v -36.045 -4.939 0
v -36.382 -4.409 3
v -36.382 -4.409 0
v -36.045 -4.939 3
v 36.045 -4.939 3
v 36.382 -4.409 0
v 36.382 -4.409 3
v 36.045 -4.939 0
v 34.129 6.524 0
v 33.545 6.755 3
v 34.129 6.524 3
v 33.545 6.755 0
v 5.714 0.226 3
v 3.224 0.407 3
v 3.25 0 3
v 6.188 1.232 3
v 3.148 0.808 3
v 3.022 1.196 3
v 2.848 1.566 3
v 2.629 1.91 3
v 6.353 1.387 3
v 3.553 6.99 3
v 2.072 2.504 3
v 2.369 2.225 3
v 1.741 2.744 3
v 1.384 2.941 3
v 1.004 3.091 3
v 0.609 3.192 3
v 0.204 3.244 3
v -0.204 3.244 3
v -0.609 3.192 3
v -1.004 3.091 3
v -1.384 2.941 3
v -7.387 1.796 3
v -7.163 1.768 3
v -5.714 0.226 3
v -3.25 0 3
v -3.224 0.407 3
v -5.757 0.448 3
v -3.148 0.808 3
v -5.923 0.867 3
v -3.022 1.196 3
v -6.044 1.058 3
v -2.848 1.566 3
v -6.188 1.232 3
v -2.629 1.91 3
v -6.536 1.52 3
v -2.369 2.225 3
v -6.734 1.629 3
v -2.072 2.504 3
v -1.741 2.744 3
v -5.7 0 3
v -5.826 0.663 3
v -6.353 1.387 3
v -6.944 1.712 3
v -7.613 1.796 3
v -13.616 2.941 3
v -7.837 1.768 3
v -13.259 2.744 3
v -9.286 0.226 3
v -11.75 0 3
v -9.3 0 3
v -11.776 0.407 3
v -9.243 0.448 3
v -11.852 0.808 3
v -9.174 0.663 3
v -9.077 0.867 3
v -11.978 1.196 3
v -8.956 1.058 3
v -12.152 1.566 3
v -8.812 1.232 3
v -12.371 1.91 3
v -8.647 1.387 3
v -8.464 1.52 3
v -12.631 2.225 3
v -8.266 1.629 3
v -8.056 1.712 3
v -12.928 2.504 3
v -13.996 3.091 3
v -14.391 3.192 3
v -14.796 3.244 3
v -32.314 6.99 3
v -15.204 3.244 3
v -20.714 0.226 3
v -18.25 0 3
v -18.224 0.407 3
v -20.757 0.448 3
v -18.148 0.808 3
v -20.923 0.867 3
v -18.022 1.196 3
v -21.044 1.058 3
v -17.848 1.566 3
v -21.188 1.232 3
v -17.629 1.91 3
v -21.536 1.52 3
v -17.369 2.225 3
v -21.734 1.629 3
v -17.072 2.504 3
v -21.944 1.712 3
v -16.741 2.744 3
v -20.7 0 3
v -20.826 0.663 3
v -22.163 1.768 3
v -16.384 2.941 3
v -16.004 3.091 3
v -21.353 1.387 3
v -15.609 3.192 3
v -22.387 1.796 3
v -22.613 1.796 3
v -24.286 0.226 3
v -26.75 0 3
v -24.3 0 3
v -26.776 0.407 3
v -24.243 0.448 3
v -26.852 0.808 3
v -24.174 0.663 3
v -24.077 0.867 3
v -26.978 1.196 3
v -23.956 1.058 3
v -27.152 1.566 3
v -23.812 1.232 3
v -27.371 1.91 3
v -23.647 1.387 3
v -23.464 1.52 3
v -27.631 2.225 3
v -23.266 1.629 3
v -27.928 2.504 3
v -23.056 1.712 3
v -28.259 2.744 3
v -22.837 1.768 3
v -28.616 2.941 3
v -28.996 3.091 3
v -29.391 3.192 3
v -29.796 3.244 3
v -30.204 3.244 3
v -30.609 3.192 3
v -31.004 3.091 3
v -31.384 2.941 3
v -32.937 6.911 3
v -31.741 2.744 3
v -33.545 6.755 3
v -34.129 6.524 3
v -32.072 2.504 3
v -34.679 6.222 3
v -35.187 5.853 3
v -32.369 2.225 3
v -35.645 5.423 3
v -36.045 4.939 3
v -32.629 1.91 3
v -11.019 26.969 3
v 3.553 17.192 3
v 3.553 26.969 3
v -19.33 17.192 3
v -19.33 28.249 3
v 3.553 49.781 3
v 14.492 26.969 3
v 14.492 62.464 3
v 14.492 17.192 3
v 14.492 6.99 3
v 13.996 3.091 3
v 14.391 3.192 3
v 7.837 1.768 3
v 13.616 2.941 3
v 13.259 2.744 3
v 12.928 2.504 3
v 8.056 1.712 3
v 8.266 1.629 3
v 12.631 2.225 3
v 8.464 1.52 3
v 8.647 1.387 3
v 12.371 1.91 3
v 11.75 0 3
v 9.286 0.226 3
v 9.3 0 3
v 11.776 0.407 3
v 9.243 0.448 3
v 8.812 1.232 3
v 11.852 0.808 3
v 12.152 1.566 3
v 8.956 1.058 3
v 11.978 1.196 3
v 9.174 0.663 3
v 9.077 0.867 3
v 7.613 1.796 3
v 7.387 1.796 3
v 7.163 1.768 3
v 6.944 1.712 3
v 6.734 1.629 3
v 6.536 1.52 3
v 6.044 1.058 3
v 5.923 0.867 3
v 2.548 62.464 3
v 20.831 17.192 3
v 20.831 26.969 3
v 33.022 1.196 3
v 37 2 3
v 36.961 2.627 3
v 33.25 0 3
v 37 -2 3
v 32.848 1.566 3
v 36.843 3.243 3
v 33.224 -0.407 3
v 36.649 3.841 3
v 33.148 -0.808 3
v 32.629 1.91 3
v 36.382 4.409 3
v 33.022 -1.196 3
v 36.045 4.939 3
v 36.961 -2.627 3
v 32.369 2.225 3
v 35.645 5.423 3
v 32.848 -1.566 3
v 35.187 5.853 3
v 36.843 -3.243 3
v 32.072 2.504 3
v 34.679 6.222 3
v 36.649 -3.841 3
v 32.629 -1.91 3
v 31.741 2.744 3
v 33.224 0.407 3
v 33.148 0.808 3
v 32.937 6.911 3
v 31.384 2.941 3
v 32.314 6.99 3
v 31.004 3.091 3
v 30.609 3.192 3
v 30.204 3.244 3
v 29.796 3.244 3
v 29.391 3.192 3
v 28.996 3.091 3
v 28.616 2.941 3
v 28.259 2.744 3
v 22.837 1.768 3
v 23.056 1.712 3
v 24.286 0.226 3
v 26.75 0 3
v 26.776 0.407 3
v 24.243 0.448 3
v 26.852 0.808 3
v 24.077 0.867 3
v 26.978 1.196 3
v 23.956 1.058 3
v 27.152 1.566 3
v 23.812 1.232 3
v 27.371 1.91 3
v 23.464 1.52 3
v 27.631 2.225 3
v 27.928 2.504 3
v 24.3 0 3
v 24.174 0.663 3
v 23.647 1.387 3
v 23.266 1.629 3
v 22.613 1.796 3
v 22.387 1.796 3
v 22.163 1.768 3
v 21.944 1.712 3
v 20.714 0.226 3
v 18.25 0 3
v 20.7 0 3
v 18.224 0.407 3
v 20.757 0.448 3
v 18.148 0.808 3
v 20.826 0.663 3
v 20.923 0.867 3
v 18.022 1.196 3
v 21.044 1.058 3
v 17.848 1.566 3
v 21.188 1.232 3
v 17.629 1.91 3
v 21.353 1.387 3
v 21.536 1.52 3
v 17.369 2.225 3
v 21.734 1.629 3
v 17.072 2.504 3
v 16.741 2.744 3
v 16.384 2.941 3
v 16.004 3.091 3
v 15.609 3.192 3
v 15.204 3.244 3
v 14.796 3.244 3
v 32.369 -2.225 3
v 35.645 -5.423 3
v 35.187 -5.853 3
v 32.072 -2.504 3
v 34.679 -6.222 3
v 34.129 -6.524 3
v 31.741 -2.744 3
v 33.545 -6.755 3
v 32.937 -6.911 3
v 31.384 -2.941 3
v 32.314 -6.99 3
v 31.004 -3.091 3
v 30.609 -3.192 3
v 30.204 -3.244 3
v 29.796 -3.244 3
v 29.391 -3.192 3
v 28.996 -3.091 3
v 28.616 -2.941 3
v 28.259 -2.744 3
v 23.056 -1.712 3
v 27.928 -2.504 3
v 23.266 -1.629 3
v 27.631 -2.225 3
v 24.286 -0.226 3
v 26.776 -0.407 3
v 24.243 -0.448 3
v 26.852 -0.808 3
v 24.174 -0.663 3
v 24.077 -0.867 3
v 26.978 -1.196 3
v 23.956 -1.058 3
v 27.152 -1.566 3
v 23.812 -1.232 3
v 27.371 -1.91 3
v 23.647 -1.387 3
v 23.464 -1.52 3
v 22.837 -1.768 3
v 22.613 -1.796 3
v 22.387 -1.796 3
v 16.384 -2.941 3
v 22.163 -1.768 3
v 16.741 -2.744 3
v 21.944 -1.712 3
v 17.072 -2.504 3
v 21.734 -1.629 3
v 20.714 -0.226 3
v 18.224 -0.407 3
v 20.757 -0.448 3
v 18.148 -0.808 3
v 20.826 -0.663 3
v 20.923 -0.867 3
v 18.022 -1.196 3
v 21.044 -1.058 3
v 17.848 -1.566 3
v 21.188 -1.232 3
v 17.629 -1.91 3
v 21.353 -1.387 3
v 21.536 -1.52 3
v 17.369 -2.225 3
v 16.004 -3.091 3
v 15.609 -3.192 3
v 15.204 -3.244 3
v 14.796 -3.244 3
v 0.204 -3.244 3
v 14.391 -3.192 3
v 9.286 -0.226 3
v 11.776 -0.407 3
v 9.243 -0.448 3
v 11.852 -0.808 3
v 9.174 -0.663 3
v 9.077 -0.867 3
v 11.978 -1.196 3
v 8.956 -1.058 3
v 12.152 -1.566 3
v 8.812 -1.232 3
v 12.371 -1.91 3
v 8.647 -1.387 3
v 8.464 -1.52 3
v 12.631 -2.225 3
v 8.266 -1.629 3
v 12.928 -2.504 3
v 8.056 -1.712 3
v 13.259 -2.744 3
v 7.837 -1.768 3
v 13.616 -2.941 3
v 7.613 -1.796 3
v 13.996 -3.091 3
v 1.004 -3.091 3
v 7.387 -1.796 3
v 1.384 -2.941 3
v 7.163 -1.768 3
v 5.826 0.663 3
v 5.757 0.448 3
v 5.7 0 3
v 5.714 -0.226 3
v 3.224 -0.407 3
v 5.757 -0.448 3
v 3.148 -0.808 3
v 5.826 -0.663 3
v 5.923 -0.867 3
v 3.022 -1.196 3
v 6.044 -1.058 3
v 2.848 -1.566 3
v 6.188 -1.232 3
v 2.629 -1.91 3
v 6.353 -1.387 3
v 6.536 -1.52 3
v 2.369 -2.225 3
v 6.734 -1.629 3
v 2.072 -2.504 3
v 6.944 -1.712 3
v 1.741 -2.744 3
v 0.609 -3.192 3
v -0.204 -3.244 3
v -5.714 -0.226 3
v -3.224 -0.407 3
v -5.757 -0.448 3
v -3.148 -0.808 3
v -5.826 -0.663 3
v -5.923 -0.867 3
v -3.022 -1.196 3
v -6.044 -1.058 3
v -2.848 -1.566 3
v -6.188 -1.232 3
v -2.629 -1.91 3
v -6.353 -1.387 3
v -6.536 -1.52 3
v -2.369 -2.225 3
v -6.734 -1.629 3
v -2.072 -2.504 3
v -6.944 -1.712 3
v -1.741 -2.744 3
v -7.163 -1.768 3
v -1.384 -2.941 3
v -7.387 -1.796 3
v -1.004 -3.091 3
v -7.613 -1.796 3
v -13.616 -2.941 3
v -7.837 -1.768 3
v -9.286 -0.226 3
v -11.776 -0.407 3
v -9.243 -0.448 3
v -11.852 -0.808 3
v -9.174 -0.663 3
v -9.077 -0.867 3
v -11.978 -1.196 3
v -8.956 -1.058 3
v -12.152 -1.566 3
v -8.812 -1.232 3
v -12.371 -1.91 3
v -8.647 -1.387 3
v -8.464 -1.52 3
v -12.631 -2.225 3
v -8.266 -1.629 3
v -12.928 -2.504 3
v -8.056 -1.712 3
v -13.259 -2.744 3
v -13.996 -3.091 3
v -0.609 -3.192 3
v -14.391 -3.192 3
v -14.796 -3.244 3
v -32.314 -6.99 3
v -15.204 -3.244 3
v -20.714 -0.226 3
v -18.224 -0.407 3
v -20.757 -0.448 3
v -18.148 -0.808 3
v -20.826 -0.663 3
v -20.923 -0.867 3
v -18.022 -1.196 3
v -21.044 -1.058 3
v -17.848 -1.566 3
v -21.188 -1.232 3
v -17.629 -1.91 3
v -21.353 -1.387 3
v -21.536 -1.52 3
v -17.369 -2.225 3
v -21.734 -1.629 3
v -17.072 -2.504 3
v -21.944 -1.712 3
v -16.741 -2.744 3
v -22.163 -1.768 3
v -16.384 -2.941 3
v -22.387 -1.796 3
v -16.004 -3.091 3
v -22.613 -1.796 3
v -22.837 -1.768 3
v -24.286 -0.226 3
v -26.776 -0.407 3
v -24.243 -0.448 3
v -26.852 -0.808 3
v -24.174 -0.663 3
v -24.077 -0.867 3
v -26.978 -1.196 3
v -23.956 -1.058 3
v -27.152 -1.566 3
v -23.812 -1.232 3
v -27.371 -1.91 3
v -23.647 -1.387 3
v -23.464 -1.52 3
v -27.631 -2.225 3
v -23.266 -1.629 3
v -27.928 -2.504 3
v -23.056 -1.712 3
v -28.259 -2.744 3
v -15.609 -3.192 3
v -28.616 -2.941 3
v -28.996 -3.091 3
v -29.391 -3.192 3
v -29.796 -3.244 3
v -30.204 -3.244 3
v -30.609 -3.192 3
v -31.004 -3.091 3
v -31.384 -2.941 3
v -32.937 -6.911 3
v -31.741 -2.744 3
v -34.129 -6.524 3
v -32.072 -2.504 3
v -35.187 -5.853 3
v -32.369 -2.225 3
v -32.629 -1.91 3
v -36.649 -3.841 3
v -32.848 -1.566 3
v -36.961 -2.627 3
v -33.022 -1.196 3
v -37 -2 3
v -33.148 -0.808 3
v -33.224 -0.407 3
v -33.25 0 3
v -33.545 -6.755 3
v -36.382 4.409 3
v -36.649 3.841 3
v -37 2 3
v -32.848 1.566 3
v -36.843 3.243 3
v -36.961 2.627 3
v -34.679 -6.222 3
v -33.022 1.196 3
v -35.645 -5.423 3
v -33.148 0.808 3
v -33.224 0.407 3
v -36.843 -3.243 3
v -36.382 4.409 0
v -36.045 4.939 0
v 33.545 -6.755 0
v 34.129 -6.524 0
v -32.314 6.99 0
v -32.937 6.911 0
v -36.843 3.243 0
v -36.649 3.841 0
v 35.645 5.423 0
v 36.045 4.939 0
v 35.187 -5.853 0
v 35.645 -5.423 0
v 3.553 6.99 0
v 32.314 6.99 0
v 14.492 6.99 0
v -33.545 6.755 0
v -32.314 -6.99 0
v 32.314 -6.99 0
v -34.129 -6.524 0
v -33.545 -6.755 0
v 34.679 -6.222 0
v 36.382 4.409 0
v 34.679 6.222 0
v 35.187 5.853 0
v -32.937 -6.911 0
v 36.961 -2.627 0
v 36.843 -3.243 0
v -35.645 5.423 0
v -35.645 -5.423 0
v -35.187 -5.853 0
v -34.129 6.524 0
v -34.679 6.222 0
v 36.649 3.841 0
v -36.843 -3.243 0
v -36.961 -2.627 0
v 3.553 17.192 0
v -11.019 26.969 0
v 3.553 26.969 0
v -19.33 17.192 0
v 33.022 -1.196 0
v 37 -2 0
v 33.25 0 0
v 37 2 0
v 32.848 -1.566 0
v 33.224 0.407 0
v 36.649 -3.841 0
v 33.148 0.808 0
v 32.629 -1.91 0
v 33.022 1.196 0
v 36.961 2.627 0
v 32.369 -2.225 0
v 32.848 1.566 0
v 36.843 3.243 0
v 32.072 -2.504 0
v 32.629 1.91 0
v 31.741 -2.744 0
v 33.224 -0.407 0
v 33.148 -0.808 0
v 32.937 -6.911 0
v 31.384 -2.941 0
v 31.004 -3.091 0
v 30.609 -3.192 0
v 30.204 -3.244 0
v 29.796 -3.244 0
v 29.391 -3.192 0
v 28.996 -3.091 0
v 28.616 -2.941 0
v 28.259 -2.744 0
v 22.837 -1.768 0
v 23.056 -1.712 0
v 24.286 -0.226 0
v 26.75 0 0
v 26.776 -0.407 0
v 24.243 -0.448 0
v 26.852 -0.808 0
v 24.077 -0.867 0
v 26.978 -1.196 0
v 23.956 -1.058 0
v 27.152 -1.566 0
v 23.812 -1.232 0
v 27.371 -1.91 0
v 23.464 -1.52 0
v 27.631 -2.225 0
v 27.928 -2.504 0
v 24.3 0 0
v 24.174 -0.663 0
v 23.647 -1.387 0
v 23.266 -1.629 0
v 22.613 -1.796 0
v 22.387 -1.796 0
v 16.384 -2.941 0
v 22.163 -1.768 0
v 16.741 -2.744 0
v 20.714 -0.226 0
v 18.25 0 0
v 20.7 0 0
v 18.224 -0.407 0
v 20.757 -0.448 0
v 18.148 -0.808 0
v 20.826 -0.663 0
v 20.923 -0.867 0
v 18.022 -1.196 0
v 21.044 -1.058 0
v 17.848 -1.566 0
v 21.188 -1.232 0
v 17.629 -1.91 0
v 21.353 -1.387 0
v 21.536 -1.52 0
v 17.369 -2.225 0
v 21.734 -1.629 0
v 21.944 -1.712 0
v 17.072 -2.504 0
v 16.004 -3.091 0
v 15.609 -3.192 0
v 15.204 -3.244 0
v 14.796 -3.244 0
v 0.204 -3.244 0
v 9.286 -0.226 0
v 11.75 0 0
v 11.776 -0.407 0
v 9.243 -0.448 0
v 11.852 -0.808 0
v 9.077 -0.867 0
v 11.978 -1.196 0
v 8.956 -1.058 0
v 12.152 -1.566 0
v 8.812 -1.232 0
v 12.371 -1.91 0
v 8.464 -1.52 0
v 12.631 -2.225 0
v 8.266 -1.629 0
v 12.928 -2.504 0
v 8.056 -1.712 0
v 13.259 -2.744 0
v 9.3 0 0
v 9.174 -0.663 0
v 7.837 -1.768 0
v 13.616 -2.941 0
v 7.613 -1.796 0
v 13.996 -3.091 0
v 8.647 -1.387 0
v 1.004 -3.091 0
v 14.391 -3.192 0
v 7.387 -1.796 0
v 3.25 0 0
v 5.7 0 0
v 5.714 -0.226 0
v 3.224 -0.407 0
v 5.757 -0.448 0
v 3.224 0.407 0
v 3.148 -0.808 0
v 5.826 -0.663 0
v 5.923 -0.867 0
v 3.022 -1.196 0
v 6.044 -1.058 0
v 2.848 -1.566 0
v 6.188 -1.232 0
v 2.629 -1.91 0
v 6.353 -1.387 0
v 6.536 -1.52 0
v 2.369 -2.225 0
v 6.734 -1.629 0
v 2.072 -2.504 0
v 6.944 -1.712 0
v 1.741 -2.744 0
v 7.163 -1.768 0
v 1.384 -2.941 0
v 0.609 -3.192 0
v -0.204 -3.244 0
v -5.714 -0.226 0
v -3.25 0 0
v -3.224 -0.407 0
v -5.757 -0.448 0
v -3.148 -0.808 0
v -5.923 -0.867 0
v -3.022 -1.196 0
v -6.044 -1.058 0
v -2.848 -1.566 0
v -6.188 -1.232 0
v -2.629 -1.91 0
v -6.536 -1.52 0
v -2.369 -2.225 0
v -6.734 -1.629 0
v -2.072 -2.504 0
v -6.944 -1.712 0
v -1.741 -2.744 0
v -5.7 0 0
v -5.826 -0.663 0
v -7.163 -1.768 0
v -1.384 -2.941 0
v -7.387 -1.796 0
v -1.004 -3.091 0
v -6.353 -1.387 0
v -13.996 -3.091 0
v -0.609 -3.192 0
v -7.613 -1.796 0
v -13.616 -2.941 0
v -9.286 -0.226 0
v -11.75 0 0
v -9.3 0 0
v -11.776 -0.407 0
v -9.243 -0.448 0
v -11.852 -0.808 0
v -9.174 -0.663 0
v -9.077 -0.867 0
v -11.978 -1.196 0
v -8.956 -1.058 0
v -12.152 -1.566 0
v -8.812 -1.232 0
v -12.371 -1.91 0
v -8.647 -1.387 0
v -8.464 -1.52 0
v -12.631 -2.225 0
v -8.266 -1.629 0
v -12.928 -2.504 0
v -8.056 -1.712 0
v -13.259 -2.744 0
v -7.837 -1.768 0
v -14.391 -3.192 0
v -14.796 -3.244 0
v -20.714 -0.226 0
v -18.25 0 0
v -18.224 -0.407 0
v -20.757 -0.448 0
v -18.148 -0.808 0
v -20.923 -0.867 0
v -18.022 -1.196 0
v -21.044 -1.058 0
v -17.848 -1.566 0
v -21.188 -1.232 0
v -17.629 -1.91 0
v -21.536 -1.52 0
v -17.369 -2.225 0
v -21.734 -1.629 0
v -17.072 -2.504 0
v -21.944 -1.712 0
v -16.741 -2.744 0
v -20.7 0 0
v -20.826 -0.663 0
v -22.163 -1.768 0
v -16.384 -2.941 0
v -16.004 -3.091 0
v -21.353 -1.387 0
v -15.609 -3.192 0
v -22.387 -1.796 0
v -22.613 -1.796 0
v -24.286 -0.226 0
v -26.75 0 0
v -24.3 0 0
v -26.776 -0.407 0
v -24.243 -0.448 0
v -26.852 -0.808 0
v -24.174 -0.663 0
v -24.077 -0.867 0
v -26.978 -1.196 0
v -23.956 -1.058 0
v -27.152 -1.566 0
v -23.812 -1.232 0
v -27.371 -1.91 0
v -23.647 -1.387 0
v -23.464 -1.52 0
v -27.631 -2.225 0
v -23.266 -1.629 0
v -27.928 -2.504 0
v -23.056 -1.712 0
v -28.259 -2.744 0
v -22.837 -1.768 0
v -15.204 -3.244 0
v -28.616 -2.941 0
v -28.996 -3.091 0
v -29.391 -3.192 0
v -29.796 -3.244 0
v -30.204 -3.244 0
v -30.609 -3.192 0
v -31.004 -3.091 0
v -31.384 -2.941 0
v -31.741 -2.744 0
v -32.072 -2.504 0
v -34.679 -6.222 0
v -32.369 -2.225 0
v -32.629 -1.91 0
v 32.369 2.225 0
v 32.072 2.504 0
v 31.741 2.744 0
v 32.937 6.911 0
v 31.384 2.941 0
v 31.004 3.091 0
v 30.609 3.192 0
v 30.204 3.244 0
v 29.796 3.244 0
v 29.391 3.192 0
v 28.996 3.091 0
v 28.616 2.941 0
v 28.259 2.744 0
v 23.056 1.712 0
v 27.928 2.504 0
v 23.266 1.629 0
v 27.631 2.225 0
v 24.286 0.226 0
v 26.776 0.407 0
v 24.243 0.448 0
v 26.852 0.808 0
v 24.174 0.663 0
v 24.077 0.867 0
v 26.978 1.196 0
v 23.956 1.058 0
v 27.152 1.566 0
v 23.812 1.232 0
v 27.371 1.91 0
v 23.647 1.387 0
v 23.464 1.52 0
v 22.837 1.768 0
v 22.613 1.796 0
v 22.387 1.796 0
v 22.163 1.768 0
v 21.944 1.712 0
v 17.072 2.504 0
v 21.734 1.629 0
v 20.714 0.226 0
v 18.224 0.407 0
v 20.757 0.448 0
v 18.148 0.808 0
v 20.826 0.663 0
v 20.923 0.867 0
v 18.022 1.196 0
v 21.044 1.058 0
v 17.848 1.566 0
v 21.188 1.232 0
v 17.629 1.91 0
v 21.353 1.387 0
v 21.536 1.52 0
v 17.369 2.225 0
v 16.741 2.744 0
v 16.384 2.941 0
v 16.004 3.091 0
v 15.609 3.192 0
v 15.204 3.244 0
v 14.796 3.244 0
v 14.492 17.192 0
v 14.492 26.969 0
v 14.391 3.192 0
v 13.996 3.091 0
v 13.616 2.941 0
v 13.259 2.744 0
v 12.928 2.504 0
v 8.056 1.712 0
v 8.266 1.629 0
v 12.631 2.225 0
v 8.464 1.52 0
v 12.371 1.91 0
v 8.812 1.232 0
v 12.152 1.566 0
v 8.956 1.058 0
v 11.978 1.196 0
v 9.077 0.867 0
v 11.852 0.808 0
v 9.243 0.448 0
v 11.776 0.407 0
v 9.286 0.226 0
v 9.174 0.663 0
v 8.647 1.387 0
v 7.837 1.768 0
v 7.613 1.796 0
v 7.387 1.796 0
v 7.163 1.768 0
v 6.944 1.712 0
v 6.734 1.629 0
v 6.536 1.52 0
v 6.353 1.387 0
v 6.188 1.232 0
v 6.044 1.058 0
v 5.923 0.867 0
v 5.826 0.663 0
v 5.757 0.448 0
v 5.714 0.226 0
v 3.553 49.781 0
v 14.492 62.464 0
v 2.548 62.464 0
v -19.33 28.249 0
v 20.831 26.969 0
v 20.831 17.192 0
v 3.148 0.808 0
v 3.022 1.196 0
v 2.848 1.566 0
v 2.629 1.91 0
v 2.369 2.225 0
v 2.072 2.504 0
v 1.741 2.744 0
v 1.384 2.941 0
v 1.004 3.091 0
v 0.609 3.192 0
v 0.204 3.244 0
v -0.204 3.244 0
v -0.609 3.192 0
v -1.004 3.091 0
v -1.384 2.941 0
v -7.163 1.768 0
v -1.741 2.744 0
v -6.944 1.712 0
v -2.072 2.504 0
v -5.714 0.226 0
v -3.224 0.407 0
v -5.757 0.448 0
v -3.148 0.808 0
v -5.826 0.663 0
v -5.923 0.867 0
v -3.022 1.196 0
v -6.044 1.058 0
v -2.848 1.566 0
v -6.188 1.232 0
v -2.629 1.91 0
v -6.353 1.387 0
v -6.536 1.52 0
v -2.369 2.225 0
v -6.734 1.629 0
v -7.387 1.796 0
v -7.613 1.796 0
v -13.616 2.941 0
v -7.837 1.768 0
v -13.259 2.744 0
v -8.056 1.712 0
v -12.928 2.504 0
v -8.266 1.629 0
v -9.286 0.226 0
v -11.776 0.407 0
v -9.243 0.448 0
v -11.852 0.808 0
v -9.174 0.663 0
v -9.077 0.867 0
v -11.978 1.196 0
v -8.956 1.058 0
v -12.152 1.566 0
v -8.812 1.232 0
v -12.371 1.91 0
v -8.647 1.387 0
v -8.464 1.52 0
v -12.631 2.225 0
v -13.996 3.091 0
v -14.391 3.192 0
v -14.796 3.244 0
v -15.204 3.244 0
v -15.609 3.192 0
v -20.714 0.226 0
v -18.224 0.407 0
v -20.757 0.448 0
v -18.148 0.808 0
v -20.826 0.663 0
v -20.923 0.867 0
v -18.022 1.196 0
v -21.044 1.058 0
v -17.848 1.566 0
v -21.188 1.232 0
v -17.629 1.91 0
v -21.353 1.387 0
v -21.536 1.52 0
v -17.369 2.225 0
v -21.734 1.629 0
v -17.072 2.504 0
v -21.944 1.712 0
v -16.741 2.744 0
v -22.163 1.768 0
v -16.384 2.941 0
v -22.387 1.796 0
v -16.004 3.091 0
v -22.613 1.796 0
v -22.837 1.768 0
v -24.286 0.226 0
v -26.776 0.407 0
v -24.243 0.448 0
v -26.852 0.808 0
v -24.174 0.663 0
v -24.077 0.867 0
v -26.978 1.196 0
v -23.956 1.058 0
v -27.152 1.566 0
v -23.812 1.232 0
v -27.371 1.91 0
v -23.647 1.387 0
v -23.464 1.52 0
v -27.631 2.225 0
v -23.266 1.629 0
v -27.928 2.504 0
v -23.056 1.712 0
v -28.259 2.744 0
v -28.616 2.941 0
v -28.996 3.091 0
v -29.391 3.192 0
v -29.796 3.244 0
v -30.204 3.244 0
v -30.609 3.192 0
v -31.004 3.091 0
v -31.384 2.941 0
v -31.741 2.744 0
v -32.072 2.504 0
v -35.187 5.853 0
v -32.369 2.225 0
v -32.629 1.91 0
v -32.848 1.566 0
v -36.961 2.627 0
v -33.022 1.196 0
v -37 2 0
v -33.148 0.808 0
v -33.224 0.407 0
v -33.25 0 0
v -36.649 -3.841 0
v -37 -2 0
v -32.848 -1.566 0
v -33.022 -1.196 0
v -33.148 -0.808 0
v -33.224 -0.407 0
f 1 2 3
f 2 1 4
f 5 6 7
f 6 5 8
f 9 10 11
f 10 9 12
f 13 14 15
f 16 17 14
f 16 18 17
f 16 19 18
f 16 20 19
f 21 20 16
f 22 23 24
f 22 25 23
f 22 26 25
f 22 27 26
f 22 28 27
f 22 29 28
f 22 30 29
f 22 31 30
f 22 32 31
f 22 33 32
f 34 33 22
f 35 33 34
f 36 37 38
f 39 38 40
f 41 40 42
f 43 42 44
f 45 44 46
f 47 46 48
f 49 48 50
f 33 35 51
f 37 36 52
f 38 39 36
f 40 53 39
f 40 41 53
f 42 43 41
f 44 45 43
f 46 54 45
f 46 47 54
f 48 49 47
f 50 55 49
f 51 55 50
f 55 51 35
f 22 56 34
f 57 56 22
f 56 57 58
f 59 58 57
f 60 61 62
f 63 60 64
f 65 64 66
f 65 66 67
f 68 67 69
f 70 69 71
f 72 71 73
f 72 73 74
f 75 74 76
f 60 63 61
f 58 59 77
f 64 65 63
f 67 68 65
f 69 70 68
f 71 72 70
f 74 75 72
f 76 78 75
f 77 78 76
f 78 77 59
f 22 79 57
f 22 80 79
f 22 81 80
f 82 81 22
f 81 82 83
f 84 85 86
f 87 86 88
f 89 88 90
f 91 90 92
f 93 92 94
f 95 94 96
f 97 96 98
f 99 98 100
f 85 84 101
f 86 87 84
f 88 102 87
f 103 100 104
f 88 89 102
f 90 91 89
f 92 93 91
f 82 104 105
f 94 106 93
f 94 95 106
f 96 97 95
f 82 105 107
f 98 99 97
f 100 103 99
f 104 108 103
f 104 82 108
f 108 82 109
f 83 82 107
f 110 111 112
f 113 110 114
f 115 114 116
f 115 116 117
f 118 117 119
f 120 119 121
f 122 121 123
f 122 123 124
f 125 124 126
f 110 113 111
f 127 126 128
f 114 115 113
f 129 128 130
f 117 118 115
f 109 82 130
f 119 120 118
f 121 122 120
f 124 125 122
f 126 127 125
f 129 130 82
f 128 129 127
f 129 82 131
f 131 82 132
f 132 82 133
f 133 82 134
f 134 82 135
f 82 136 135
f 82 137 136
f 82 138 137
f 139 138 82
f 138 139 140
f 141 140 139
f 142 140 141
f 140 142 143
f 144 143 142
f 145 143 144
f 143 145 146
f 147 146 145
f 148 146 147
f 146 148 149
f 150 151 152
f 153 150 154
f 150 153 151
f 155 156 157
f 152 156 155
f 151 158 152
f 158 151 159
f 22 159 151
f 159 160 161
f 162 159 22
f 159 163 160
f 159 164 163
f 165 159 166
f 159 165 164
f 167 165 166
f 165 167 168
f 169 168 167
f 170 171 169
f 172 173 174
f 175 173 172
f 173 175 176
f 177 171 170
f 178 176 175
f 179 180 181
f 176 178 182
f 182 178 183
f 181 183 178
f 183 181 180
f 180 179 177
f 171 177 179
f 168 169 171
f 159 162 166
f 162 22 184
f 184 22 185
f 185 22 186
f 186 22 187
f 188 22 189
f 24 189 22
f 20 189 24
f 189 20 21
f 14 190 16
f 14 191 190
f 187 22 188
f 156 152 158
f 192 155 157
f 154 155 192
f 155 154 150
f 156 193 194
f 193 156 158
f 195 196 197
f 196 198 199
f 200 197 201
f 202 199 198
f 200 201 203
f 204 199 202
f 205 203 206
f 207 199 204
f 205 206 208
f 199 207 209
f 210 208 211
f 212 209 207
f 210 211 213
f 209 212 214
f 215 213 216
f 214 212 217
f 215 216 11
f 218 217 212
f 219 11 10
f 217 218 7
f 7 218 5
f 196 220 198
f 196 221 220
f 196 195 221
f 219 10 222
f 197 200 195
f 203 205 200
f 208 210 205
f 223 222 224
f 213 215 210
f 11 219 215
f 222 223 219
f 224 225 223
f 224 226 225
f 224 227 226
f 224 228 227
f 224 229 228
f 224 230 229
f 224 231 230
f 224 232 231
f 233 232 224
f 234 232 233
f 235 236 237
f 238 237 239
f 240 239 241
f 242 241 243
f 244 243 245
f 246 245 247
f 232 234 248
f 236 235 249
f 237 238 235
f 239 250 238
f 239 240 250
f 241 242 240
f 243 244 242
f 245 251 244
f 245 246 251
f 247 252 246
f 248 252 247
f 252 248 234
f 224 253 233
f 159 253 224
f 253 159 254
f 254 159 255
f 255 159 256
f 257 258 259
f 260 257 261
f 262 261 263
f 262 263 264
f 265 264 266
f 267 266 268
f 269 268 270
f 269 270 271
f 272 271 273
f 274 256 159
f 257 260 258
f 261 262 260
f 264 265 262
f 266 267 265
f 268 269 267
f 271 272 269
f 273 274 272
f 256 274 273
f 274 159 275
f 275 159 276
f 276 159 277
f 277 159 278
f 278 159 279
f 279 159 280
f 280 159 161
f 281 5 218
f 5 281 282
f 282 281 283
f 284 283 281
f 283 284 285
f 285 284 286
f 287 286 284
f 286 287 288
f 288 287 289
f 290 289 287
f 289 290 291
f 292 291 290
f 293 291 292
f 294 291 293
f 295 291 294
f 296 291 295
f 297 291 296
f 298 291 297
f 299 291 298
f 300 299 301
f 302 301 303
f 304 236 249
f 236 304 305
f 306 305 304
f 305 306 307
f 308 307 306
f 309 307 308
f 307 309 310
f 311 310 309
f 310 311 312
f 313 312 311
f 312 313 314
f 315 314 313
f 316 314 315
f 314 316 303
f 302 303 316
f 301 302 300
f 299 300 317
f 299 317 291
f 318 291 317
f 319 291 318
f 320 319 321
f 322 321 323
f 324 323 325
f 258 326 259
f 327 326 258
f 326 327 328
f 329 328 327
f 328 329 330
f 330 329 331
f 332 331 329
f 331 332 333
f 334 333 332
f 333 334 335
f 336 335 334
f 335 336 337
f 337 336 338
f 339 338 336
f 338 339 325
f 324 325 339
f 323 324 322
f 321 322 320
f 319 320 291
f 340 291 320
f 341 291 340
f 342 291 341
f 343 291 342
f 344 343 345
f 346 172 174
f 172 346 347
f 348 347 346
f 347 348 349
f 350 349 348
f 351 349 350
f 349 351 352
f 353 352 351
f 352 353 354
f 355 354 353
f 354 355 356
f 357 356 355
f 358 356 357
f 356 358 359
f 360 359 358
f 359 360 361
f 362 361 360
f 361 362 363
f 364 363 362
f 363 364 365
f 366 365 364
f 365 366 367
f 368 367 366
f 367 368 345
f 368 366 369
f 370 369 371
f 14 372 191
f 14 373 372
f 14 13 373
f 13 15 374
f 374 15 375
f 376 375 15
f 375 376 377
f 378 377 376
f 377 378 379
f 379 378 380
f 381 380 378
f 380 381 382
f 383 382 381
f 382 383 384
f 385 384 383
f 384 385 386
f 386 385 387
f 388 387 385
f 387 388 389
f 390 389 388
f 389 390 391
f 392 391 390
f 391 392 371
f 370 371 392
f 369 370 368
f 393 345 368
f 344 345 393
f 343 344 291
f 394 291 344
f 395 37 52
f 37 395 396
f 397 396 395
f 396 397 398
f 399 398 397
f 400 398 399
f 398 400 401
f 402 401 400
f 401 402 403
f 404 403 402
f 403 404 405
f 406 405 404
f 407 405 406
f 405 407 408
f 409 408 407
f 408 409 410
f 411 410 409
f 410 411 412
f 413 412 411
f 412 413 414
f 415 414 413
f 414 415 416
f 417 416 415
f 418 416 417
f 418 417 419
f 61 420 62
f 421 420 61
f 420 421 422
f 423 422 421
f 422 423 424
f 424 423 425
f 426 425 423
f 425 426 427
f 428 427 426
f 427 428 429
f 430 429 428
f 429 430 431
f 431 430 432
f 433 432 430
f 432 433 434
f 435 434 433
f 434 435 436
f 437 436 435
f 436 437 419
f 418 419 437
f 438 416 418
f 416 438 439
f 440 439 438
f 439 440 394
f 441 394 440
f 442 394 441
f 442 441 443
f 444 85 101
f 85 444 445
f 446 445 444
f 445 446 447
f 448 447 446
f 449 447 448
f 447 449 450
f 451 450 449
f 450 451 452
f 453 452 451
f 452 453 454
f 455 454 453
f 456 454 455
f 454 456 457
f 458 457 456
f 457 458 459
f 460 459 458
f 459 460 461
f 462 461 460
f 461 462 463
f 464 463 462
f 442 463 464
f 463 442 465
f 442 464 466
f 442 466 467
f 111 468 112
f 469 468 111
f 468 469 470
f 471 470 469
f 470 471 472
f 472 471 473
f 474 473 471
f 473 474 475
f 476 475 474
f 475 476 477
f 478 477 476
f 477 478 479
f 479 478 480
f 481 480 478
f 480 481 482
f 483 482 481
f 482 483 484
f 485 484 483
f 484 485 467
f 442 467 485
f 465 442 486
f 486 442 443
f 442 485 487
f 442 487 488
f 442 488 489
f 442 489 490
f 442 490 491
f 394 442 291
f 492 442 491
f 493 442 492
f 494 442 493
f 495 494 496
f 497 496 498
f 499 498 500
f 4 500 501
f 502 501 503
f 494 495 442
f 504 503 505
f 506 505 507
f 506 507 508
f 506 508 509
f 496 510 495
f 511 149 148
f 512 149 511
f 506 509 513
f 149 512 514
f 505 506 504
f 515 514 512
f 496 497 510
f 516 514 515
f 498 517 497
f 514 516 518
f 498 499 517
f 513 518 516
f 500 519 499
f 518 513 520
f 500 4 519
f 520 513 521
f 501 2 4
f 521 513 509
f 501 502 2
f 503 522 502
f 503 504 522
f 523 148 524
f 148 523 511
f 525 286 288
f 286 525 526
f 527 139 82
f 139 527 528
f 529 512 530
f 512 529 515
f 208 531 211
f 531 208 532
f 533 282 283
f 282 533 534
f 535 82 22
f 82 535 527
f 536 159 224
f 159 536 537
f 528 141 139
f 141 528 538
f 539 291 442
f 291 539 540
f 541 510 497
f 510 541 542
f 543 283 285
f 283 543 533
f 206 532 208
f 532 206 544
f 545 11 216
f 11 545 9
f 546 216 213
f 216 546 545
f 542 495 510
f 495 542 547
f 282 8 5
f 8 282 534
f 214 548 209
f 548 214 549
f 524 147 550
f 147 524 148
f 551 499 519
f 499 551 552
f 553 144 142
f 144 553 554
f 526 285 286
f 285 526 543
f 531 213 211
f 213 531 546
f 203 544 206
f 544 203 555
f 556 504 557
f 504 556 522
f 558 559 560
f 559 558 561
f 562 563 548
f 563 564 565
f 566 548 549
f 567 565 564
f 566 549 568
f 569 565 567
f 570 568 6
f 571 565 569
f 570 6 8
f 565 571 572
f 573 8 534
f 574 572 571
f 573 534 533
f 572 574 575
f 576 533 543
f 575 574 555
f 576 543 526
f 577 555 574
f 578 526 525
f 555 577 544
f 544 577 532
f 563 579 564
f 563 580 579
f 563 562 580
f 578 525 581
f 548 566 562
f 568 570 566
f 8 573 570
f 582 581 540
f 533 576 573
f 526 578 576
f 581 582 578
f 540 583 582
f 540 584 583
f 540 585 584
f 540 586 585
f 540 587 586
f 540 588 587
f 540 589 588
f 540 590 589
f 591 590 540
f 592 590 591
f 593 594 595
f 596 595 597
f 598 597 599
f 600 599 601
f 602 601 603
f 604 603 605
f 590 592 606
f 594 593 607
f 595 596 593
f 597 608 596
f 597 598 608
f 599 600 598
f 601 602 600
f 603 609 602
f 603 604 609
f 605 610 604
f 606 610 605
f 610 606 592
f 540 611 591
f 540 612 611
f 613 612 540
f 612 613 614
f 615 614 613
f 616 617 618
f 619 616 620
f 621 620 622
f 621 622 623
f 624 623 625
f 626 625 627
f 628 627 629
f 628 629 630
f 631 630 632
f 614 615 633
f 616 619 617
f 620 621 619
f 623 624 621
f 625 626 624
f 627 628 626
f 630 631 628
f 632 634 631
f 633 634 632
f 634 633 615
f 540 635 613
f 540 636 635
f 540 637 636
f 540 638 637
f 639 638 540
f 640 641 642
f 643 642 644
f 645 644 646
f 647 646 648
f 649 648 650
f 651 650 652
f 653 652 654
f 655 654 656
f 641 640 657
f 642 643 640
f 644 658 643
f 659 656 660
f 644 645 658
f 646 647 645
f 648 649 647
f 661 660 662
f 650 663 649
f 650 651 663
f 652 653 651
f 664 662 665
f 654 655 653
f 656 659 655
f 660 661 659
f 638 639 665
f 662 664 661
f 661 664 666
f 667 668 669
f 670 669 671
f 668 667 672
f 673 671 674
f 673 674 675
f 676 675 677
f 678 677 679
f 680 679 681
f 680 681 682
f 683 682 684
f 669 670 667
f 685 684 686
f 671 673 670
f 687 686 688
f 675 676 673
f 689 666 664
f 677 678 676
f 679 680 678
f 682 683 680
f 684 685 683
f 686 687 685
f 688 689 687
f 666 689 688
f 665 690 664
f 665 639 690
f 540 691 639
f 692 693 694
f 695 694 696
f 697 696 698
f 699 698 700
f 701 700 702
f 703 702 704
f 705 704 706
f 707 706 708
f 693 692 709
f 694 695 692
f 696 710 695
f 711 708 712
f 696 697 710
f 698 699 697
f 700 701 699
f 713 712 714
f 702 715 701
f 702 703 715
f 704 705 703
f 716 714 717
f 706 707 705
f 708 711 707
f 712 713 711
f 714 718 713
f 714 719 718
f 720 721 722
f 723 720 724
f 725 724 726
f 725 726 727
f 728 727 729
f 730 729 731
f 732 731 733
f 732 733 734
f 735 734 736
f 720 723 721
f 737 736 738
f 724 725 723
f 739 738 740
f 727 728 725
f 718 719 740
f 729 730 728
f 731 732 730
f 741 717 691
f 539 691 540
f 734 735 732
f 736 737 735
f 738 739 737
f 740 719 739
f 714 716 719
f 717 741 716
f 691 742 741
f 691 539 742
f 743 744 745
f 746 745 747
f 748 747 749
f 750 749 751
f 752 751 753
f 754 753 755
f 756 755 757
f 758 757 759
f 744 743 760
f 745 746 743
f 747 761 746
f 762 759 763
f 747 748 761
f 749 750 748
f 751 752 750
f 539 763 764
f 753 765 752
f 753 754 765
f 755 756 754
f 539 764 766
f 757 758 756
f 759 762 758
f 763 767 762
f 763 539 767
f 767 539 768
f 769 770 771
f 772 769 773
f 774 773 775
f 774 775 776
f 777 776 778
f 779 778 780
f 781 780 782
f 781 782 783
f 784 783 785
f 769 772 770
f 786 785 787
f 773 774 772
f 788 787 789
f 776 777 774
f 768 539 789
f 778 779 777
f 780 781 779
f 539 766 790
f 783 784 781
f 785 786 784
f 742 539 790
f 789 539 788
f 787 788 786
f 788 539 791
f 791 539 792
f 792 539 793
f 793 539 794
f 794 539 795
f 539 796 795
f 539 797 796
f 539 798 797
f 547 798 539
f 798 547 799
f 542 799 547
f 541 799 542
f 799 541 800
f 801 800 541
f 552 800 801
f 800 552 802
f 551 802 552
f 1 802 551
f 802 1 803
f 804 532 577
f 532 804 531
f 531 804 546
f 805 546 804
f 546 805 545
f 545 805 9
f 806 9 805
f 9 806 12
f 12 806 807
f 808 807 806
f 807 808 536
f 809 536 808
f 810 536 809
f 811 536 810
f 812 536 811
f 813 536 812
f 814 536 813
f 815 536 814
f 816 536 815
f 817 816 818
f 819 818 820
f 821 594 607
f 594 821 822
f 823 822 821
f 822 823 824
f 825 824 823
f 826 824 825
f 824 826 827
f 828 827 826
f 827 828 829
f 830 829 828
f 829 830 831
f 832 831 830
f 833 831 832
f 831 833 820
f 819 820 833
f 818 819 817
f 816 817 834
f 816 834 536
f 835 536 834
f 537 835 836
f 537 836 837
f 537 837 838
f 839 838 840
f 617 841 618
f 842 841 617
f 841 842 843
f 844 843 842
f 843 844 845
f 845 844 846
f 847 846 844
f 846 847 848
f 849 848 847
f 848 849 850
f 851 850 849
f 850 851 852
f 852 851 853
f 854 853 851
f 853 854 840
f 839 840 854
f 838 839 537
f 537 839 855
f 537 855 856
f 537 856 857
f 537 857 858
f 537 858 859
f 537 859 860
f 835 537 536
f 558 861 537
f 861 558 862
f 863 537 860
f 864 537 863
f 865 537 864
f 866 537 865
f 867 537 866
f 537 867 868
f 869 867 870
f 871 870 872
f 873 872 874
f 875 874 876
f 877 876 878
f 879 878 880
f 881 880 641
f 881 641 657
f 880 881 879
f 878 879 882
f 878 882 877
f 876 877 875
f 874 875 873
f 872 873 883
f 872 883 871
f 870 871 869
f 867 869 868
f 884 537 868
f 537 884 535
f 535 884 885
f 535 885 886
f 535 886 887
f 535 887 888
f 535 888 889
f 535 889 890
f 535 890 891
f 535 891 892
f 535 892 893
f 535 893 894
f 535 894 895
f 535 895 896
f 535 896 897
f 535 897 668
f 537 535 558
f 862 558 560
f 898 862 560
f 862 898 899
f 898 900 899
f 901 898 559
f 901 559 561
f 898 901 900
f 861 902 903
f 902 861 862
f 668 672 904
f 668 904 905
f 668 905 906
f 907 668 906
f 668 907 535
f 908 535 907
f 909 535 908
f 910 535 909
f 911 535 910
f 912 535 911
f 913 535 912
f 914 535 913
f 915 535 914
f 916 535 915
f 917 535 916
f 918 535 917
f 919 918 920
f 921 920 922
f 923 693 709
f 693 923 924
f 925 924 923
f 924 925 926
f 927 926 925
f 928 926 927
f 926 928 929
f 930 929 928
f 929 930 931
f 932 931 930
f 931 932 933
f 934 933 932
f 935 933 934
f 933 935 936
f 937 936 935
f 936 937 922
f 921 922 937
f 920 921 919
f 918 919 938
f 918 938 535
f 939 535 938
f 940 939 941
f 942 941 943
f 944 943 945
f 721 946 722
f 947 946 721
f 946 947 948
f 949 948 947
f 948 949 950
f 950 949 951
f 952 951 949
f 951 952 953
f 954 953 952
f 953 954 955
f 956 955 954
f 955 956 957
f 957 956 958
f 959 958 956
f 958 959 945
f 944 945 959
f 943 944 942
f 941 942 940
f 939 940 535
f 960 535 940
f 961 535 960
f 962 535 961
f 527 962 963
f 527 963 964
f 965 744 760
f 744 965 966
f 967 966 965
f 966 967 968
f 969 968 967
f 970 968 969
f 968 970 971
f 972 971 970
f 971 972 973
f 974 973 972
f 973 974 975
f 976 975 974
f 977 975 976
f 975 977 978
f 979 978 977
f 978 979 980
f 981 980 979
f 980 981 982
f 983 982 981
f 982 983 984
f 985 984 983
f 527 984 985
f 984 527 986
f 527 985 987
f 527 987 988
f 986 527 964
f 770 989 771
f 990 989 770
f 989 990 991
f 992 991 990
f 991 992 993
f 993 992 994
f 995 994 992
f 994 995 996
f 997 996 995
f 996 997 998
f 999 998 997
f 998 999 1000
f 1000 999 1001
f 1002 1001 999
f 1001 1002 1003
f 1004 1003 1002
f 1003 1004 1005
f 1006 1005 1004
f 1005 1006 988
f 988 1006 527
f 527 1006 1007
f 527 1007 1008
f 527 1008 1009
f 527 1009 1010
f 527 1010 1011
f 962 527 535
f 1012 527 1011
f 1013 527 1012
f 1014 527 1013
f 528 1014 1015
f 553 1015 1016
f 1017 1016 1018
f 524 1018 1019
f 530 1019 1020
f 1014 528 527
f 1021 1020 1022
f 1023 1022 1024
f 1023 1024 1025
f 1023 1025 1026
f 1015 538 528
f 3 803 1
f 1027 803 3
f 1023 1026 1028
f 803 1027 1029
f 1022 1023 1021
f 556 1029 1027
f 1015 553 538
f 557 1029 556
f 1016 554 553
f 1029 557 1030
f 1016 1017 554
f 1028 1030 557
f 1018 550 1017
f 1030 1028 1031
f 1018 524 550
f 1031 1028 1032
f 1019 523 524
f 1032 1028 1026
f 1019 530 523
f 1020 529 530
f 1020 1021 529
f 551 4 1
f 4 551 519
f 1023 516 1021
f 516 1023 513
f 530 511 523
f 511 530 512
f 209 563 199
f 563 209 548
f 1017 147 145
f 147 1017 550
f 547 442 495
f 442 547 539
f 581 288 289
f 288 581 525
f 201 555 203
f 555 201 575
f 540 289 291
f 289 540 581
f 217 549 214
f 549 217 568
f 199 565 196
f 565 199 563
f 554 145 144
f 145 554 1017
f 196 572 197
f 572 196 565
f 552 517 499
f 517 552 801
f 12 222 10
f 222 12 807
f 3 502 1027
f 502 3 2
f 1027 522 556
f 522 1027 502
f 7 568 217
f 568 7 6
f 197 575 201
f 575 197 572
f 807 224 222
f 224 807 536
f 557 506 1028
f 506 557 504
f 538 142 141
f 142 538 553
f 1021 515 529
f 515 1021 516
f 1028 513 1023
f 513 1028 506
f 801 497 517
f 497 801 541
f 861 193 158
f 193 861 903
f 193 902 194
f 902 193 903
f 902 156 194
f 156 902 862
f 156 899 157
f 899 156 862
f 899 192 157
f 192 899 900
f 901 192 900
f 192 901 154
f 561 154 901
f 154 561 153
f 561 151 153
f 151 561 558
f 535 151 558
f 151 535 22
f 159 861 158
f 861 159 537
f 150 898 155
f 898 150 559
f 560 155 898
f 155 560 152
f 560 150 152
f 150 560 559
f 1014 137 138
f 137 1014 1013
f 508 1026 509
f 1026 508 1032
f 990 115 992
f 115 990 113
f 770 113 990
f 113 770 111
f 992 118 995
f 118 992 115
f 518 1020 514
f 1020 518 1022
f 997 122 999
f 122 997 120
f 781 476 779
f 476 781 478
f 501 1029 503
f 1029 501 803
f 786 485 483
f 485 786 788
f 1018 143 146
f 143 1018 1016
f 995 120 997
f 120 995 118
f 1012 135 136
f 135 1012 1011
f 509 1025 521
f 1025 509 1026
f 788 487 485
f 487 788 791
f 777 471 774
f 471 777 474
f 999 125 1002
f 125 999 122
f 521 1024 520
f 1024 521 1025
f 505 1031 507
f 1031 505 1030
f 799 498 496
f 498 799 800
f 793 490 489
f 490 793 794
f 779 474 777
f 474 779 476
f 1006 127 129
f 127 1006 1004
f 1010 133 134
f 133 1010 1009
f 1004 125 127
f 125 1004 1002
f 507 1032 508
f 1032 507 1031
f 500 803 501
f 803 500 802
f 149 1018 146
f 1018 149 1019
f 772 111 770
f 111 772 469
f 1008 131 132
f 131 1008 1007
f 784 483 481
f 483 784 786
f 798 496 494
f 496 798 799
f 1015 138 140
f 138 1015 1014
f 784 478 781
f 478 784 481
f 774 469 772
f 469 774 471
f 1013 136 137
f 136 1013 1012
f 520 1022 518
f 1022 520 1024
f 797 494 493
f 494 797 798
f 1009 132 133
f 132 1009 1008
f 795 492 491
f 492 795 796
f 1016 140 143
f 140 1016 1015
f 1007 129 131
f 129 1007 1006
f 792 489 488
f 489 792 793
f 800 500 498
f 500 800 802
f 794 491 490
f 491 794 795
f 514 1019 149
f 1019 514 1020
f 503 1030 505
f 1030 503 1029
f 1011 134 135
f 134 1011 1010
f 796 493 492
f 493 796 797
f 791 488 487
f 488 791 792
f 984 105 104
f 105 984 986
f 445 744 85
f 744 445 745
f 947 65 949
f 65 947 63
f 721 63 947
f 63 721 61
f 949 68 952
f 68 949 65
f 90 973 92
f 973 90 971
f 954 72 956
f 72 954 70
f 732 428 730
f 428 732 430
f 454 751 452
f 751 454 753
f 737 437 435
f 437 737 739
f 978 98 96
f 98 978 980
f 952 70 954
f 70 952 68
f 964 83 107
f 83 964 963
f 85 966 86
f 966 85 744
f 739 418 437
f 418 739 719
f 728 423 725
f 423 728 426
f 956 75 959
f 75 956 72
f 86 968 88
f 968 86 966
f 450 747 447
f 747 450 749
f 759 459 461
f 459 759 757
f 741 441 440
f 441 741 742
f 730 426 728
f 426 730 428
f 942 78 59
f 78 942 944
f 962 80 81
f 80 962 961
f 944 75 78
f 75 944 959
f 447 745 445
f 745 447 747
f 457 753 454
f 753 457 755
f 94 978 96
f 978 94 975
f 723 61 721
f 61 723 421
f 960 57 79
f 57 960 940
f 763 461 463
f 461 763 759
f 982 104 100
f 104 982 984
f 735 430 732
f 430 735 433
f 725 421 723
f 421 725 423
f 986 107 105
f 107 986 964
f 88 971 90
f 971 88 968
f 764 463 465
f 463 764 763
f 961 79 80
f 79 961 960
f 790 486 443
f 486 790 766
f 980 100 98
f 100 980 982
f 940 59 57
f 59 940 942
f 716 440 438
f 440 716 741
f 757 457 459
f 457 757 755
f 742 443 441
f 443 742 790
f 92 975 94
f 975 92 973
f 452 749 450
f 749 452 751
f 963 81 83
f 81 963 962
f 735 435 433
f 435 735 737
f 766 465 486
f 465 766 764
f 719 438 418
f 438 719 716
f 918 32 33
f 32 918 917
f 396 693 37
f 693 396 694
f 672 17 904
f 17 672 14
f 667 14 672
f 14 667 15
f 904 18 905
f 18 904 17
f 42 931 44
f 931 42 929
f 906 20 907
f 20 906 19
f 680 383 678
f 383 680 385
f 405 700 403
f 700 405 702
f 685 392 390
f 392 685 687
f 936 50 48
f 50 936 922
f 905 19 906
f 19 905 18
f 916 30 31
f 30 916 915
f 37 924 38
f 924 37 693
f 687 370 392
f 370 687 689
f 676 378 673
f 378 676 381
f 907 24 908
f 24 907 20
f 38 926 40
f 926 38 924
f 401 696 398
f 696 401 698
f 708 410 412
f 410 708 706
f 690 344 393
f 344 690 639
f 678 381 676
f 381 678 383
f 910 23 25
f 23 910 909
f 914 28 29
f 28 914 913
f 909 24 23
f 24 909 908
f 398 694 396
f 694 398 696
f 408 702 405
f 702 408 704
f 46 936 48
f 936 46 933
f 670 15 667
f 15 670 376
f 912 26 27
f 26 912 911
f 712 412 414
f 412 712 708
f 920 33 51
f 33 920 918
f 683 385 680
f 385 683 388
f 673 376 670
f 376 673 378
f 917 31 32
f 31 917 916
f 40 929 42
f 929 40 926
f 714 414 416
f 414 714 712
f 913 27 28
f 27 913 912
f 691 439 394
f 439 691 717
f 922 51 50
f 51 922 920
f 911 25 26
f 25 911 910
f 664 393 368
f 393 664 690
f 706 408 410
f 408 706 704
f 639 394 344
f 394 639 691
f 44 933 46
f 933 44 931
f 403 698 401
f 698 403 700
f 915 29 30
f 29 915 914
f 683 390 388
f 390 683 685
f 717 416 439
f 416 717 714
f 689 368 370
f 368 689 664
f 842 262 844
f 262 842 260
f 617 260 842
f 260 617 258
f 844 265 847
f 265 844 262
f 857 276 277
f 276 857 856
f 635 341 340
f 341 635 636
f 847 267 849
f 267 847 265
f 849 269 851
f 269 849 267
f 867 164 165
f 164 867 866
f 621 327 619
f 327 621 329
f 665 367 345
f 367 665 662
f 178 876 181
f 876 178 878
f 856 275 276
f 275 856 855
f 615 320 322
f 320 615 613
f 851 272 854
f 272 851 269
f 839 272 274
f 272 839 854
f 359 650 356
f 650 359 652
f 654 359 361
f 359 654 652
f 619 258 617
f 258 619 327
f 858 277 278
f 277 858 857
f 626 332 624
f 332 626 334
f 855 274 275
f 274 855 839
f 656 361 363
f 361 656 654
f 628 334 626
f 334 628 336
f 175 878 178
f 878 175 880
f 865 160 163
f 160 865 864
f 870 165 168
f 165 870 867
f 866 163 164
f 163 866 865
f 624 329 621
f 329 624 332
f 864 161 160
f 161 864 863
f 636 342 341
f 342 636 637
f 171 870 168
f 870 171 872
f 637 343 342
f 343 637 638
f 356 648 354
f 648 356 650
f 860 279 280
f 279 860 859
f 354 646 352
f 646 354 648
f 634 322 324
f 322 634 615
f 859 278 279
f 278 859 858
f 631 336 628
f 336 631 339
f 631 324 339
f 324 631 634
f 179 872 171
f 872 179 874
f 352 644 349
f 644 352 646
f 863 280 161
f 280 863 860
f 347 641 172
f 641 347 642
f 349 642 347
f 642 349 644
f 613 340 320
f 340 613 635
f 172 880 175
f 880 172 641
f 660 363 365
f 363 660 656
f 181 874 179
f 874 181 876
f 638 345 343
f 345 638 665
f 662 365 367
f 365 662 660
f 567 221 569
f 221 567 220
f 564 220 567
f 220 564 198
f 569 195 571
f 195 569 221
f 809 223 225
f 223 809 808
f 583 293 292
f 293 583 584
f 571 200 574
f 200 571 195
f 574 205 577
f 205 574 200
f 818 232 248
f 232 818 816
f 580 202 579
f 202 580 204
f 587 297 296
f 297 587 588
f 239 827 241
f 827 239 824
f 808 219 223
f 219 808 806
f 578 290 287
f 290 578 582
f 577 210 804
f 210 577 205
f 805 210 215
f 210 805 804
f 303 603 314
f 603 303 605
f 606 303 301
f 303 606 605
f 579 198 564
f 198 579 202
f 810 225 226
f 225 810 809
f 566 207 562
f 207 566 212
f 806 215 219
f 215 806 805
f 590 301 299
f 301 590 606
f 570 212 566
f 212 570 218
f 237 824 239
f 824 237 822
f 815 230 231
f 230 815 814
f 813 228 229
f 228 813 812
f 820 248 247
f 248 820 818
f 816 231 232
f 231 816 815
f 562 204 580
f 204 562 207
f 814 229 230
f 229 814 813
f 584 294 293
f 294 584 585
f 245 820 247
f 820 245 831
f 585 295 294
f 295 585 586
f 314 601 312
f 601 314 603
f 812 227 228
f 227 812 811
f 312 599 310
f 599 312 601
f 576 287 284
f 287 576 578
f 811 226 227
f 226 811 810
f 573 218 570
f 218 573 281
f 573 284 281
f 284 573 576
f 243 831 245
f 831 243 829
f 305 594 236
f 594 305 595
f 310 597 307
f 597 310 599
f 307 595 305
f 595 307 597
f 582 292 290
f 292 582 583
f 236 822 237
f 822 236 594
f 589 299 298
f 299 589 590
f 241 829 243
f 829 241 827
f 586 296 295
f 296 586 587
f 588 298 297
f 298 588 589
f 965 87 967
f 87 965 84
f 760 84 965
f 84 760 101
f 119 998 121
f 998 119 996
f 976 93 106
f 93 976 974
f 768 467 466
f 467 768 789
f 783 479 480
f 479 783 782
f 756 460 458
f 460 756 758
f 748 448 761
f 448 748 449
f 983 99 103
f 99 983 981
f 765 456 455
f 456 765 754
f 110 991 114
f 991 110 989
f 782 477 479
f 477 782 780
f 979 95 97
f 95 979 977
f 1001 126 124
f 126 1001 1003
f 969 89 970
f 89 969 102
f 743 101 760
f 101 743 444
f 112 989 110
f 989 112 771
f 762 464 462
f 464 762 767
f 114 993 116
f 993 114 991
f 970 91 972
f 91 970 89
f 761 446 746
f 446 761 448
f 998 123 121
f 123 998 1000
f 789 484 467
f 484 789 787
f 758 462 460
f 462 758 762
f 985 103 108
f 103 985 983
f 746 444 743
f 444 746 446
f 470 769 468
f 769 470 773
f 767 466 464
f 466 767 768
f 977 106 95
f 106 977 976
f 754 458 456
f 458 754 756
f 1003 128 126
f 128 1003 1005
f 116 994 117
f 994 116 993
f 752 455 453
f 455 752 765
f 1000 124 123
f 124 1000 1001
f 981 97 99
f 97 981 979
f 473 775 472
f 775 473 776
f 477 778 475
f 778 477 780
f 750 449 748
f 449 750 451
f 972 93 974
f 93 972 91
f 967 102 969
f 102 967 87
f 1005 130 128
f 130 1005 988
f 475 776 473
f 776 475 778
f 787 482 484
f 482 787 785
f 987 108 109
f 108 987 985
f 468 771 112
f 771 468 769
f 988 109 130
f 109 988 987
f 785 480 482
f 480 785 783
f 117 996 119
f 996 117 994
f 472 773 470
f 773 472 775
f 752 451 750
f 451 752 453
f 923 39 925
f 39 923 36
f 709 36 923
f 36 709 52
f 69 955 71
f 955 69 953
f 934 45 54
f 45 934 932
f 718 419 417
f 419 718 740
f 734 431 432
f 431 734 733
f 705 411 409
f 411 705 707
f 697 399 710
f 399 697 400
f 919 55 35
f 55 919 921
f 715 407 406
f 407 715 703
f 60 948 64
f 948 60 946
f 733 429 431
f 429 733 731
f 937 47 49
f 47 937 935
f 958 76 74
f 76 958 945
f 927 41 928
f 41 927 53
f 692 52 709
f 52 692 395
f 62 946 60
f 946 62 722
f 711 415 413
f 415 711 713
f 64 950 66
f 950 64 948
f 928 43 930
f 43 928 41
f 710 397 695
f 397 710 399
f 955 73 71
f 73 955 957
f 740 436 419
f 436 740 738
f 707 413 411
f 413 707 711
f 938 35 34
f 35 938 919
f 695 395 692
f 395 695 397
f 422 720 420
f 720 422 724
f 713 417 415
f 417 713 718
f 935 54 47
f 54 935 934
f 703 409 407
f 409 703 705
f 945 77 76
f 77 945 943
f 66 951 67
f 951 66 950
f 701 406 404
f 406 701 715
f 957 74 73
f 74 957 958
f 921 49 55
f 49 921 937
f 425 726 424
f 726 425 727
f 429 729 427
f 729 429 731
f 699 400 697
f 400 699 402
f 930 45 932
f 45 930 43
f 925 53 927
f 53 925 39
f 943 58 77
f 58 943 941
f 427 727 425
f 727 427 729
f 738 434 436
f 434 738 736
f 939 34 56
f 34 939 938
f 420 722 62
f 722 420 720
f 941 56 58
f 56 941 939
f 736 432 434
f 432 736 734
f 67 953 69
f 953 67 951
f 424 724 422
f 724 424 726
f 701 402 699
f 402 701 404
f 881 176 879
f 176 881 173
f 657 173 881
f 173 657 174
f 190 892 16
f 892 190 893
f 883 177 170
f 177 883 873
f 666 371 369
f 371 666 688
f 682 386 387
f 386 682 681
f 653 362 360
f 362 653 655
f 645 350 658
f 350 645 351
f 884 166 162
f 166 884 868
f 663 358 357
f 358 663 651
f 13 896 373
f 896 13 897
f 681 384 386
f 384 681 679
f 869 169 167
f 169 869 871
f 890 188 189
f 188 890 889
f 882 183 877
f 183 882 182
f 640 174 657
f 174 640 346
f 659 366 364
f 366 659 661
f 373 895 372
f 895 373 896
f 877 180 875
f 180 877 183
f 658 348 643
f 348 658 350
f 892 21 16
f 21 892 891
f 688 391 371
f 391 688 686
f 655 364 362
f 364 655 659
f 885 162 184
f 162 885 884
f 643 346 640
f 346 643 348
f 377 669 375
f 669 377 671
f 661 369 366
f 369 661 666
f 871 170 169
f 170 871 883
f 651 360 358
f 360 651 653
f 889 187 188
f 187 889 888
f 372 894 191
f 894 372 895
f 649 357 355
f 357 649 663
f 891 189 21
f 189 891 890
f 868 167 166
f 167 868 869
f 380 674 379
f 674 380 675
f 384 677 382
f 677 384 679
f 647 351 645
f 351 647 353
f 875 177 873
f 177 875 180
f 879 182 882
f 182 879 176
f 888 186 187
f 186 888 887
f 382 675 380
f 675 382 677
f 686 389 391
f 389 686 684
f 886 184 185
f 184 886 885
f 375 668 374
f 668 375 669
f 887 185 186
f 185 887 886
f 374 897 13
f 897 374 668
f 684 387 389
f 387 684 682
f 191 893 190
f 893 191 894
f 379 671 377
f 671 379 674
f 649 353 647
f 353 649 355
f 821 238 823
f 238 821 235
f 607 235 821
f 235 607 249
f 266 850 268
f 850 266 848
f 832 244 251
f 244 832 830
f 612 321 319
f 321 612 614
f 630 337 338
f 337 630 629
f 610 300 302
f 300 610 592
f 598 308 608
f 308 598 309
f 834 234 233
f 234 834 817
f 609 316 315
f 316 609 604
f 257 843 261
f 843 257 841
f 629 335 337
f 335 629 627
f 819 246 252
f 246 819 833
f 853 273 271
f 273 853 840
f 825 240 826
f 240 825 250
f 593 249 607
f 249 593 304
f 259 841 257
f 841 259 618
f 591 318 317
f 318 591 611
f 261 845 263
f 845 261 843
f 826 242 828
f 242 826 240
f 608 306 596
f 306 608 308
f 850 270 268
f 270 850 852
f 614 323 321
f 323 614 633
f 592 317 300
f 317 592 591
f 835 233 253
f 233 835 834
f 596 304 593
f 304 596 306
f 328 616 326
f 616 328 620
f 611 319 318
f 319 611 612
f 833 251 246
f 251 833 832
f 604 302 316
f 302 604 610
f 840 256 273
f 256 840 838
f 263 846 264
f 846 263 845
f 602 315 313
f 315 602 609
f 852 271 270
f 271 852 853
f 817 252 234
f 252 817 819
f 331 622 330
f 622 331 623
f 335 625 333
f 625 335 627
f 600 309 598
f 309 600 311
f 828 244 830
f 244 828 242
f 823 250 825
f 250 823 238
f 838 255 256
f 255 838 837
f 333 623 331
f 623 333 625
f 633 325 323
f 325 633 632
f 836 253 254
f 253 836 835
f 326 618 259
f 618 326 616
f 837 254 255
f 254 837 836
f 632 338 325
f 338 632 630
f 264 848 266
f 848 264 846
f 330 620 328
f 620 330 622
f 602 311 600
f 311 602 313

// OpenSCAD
$fn = 50;


difference() {
	union() {
		hull() {
			translate(v = [-32.0000000000, 2.0000000000, 0]) {
				cylinder(h = 3, r = 5);
			}
			translate(v = [32.0000000000, 2.0000000000, 0]) {
				cylinder(h = 3, r = 5);
			}
			translate(v = [-32.0000000000, -2.0000000000, 0]) {
				cylinder(h = 3, r = 5);
			}
			translate(v = [32.0000000000, -2.0000000000, 0]) {
				cylinder(h = 3, r = 5);
			}
		}
		translate(v = [0, 61.1111111111, 0]) {
			linear_extrude(height = 3) {
				text(font = "DejaVu Sans Mono:style=Bold", halign = "center", size = 57.0000000000, text = "4", valign = "top");
			}
		}
	}
	union() {
		translate(v = [-30.0000000000, 0.0000000000, 0]) {
			translate(v = [0, 0, -100]) {
				cylinder(h = 200, r = 3.2500000000);
			}
		}
		translate(v = [-15.0000000000, 0.0000000000, 0]) {
			translate(v = [0, 0, -100]) {
				cylinder(h = 200, r = 3.2500000000);
			}
		}
		translate(v = [0, 0, -100]) {
			cylinder(h = 200, r = 3.2500000000);
		}
		translate(v = [15.0000000000, 0.0000000000, 0]) {
			translate(v = [0, 0, -100]) {
				cylinder(h = 200, r = 3.2500000000);
			}
		}
		translate(v = [30.0000000000, 0.0000000000, 0]) {
			translate(v = [0, 0, -100]) {
				cylinder(h = 200, r = 3.2500000000);
			}
		}
		translate(v = [-30.0000000000, 0.0000000000, 0]) {
			translate(v = [0, 0, -100]) {
				cylinder(h = 200, r = 1.8000000000);
			}
		}
		translate(v = [-22.5000000000, 0.0000000000, 0]) {
			translate(v = [0, 0, -100]) {
				cylinder(h = 200, r = 1.8000000000);
			}
		}
		translate(v = [-15.0000000000, 0.0000000000, 0]) {
			translate(v = [0, 0, -100]) {
				cylinder(h = 200, r = 1.8000000000);
			}
		}
		translate(v = [-7.5000000000, 0.0000000000, 0]) {
			translate(v = [0, 0, -100]) {
				cylinder(h = 200, r = 1.8000000000);
			}
		}
		translate(v = [0, 0, -100]) {
			cylinder(h = 200, r = 1.8000000000);
		}
		translate(v = [7.5000000000, 0.0000000000, 0]) {
			translate(v = [0, 0, -100]) {
				cylinder(h = 200, r = 1.8000000000);
			}
		}
		translate(v = [15.0000000000, 0.0000000000, 0]) {
			translate(v = [0, 0, -100]) {
				cylinder(h = 200, r = 1.8000000000);
			}
		}
		translate(v = [22.5000000000, 0.0000000000, 0]) {
			translate(v = [0, 0, -100]) {
				cylinder(h = 200, r = 1.8000000000);
			}
		}
		translate(v = [30.0000000000, 0.0000000000, 0]) {
			translate(v = [0, 0, -100]) {
				cylinder(h = 200, r = 1.8000000000);
			}
		}
	}
}
